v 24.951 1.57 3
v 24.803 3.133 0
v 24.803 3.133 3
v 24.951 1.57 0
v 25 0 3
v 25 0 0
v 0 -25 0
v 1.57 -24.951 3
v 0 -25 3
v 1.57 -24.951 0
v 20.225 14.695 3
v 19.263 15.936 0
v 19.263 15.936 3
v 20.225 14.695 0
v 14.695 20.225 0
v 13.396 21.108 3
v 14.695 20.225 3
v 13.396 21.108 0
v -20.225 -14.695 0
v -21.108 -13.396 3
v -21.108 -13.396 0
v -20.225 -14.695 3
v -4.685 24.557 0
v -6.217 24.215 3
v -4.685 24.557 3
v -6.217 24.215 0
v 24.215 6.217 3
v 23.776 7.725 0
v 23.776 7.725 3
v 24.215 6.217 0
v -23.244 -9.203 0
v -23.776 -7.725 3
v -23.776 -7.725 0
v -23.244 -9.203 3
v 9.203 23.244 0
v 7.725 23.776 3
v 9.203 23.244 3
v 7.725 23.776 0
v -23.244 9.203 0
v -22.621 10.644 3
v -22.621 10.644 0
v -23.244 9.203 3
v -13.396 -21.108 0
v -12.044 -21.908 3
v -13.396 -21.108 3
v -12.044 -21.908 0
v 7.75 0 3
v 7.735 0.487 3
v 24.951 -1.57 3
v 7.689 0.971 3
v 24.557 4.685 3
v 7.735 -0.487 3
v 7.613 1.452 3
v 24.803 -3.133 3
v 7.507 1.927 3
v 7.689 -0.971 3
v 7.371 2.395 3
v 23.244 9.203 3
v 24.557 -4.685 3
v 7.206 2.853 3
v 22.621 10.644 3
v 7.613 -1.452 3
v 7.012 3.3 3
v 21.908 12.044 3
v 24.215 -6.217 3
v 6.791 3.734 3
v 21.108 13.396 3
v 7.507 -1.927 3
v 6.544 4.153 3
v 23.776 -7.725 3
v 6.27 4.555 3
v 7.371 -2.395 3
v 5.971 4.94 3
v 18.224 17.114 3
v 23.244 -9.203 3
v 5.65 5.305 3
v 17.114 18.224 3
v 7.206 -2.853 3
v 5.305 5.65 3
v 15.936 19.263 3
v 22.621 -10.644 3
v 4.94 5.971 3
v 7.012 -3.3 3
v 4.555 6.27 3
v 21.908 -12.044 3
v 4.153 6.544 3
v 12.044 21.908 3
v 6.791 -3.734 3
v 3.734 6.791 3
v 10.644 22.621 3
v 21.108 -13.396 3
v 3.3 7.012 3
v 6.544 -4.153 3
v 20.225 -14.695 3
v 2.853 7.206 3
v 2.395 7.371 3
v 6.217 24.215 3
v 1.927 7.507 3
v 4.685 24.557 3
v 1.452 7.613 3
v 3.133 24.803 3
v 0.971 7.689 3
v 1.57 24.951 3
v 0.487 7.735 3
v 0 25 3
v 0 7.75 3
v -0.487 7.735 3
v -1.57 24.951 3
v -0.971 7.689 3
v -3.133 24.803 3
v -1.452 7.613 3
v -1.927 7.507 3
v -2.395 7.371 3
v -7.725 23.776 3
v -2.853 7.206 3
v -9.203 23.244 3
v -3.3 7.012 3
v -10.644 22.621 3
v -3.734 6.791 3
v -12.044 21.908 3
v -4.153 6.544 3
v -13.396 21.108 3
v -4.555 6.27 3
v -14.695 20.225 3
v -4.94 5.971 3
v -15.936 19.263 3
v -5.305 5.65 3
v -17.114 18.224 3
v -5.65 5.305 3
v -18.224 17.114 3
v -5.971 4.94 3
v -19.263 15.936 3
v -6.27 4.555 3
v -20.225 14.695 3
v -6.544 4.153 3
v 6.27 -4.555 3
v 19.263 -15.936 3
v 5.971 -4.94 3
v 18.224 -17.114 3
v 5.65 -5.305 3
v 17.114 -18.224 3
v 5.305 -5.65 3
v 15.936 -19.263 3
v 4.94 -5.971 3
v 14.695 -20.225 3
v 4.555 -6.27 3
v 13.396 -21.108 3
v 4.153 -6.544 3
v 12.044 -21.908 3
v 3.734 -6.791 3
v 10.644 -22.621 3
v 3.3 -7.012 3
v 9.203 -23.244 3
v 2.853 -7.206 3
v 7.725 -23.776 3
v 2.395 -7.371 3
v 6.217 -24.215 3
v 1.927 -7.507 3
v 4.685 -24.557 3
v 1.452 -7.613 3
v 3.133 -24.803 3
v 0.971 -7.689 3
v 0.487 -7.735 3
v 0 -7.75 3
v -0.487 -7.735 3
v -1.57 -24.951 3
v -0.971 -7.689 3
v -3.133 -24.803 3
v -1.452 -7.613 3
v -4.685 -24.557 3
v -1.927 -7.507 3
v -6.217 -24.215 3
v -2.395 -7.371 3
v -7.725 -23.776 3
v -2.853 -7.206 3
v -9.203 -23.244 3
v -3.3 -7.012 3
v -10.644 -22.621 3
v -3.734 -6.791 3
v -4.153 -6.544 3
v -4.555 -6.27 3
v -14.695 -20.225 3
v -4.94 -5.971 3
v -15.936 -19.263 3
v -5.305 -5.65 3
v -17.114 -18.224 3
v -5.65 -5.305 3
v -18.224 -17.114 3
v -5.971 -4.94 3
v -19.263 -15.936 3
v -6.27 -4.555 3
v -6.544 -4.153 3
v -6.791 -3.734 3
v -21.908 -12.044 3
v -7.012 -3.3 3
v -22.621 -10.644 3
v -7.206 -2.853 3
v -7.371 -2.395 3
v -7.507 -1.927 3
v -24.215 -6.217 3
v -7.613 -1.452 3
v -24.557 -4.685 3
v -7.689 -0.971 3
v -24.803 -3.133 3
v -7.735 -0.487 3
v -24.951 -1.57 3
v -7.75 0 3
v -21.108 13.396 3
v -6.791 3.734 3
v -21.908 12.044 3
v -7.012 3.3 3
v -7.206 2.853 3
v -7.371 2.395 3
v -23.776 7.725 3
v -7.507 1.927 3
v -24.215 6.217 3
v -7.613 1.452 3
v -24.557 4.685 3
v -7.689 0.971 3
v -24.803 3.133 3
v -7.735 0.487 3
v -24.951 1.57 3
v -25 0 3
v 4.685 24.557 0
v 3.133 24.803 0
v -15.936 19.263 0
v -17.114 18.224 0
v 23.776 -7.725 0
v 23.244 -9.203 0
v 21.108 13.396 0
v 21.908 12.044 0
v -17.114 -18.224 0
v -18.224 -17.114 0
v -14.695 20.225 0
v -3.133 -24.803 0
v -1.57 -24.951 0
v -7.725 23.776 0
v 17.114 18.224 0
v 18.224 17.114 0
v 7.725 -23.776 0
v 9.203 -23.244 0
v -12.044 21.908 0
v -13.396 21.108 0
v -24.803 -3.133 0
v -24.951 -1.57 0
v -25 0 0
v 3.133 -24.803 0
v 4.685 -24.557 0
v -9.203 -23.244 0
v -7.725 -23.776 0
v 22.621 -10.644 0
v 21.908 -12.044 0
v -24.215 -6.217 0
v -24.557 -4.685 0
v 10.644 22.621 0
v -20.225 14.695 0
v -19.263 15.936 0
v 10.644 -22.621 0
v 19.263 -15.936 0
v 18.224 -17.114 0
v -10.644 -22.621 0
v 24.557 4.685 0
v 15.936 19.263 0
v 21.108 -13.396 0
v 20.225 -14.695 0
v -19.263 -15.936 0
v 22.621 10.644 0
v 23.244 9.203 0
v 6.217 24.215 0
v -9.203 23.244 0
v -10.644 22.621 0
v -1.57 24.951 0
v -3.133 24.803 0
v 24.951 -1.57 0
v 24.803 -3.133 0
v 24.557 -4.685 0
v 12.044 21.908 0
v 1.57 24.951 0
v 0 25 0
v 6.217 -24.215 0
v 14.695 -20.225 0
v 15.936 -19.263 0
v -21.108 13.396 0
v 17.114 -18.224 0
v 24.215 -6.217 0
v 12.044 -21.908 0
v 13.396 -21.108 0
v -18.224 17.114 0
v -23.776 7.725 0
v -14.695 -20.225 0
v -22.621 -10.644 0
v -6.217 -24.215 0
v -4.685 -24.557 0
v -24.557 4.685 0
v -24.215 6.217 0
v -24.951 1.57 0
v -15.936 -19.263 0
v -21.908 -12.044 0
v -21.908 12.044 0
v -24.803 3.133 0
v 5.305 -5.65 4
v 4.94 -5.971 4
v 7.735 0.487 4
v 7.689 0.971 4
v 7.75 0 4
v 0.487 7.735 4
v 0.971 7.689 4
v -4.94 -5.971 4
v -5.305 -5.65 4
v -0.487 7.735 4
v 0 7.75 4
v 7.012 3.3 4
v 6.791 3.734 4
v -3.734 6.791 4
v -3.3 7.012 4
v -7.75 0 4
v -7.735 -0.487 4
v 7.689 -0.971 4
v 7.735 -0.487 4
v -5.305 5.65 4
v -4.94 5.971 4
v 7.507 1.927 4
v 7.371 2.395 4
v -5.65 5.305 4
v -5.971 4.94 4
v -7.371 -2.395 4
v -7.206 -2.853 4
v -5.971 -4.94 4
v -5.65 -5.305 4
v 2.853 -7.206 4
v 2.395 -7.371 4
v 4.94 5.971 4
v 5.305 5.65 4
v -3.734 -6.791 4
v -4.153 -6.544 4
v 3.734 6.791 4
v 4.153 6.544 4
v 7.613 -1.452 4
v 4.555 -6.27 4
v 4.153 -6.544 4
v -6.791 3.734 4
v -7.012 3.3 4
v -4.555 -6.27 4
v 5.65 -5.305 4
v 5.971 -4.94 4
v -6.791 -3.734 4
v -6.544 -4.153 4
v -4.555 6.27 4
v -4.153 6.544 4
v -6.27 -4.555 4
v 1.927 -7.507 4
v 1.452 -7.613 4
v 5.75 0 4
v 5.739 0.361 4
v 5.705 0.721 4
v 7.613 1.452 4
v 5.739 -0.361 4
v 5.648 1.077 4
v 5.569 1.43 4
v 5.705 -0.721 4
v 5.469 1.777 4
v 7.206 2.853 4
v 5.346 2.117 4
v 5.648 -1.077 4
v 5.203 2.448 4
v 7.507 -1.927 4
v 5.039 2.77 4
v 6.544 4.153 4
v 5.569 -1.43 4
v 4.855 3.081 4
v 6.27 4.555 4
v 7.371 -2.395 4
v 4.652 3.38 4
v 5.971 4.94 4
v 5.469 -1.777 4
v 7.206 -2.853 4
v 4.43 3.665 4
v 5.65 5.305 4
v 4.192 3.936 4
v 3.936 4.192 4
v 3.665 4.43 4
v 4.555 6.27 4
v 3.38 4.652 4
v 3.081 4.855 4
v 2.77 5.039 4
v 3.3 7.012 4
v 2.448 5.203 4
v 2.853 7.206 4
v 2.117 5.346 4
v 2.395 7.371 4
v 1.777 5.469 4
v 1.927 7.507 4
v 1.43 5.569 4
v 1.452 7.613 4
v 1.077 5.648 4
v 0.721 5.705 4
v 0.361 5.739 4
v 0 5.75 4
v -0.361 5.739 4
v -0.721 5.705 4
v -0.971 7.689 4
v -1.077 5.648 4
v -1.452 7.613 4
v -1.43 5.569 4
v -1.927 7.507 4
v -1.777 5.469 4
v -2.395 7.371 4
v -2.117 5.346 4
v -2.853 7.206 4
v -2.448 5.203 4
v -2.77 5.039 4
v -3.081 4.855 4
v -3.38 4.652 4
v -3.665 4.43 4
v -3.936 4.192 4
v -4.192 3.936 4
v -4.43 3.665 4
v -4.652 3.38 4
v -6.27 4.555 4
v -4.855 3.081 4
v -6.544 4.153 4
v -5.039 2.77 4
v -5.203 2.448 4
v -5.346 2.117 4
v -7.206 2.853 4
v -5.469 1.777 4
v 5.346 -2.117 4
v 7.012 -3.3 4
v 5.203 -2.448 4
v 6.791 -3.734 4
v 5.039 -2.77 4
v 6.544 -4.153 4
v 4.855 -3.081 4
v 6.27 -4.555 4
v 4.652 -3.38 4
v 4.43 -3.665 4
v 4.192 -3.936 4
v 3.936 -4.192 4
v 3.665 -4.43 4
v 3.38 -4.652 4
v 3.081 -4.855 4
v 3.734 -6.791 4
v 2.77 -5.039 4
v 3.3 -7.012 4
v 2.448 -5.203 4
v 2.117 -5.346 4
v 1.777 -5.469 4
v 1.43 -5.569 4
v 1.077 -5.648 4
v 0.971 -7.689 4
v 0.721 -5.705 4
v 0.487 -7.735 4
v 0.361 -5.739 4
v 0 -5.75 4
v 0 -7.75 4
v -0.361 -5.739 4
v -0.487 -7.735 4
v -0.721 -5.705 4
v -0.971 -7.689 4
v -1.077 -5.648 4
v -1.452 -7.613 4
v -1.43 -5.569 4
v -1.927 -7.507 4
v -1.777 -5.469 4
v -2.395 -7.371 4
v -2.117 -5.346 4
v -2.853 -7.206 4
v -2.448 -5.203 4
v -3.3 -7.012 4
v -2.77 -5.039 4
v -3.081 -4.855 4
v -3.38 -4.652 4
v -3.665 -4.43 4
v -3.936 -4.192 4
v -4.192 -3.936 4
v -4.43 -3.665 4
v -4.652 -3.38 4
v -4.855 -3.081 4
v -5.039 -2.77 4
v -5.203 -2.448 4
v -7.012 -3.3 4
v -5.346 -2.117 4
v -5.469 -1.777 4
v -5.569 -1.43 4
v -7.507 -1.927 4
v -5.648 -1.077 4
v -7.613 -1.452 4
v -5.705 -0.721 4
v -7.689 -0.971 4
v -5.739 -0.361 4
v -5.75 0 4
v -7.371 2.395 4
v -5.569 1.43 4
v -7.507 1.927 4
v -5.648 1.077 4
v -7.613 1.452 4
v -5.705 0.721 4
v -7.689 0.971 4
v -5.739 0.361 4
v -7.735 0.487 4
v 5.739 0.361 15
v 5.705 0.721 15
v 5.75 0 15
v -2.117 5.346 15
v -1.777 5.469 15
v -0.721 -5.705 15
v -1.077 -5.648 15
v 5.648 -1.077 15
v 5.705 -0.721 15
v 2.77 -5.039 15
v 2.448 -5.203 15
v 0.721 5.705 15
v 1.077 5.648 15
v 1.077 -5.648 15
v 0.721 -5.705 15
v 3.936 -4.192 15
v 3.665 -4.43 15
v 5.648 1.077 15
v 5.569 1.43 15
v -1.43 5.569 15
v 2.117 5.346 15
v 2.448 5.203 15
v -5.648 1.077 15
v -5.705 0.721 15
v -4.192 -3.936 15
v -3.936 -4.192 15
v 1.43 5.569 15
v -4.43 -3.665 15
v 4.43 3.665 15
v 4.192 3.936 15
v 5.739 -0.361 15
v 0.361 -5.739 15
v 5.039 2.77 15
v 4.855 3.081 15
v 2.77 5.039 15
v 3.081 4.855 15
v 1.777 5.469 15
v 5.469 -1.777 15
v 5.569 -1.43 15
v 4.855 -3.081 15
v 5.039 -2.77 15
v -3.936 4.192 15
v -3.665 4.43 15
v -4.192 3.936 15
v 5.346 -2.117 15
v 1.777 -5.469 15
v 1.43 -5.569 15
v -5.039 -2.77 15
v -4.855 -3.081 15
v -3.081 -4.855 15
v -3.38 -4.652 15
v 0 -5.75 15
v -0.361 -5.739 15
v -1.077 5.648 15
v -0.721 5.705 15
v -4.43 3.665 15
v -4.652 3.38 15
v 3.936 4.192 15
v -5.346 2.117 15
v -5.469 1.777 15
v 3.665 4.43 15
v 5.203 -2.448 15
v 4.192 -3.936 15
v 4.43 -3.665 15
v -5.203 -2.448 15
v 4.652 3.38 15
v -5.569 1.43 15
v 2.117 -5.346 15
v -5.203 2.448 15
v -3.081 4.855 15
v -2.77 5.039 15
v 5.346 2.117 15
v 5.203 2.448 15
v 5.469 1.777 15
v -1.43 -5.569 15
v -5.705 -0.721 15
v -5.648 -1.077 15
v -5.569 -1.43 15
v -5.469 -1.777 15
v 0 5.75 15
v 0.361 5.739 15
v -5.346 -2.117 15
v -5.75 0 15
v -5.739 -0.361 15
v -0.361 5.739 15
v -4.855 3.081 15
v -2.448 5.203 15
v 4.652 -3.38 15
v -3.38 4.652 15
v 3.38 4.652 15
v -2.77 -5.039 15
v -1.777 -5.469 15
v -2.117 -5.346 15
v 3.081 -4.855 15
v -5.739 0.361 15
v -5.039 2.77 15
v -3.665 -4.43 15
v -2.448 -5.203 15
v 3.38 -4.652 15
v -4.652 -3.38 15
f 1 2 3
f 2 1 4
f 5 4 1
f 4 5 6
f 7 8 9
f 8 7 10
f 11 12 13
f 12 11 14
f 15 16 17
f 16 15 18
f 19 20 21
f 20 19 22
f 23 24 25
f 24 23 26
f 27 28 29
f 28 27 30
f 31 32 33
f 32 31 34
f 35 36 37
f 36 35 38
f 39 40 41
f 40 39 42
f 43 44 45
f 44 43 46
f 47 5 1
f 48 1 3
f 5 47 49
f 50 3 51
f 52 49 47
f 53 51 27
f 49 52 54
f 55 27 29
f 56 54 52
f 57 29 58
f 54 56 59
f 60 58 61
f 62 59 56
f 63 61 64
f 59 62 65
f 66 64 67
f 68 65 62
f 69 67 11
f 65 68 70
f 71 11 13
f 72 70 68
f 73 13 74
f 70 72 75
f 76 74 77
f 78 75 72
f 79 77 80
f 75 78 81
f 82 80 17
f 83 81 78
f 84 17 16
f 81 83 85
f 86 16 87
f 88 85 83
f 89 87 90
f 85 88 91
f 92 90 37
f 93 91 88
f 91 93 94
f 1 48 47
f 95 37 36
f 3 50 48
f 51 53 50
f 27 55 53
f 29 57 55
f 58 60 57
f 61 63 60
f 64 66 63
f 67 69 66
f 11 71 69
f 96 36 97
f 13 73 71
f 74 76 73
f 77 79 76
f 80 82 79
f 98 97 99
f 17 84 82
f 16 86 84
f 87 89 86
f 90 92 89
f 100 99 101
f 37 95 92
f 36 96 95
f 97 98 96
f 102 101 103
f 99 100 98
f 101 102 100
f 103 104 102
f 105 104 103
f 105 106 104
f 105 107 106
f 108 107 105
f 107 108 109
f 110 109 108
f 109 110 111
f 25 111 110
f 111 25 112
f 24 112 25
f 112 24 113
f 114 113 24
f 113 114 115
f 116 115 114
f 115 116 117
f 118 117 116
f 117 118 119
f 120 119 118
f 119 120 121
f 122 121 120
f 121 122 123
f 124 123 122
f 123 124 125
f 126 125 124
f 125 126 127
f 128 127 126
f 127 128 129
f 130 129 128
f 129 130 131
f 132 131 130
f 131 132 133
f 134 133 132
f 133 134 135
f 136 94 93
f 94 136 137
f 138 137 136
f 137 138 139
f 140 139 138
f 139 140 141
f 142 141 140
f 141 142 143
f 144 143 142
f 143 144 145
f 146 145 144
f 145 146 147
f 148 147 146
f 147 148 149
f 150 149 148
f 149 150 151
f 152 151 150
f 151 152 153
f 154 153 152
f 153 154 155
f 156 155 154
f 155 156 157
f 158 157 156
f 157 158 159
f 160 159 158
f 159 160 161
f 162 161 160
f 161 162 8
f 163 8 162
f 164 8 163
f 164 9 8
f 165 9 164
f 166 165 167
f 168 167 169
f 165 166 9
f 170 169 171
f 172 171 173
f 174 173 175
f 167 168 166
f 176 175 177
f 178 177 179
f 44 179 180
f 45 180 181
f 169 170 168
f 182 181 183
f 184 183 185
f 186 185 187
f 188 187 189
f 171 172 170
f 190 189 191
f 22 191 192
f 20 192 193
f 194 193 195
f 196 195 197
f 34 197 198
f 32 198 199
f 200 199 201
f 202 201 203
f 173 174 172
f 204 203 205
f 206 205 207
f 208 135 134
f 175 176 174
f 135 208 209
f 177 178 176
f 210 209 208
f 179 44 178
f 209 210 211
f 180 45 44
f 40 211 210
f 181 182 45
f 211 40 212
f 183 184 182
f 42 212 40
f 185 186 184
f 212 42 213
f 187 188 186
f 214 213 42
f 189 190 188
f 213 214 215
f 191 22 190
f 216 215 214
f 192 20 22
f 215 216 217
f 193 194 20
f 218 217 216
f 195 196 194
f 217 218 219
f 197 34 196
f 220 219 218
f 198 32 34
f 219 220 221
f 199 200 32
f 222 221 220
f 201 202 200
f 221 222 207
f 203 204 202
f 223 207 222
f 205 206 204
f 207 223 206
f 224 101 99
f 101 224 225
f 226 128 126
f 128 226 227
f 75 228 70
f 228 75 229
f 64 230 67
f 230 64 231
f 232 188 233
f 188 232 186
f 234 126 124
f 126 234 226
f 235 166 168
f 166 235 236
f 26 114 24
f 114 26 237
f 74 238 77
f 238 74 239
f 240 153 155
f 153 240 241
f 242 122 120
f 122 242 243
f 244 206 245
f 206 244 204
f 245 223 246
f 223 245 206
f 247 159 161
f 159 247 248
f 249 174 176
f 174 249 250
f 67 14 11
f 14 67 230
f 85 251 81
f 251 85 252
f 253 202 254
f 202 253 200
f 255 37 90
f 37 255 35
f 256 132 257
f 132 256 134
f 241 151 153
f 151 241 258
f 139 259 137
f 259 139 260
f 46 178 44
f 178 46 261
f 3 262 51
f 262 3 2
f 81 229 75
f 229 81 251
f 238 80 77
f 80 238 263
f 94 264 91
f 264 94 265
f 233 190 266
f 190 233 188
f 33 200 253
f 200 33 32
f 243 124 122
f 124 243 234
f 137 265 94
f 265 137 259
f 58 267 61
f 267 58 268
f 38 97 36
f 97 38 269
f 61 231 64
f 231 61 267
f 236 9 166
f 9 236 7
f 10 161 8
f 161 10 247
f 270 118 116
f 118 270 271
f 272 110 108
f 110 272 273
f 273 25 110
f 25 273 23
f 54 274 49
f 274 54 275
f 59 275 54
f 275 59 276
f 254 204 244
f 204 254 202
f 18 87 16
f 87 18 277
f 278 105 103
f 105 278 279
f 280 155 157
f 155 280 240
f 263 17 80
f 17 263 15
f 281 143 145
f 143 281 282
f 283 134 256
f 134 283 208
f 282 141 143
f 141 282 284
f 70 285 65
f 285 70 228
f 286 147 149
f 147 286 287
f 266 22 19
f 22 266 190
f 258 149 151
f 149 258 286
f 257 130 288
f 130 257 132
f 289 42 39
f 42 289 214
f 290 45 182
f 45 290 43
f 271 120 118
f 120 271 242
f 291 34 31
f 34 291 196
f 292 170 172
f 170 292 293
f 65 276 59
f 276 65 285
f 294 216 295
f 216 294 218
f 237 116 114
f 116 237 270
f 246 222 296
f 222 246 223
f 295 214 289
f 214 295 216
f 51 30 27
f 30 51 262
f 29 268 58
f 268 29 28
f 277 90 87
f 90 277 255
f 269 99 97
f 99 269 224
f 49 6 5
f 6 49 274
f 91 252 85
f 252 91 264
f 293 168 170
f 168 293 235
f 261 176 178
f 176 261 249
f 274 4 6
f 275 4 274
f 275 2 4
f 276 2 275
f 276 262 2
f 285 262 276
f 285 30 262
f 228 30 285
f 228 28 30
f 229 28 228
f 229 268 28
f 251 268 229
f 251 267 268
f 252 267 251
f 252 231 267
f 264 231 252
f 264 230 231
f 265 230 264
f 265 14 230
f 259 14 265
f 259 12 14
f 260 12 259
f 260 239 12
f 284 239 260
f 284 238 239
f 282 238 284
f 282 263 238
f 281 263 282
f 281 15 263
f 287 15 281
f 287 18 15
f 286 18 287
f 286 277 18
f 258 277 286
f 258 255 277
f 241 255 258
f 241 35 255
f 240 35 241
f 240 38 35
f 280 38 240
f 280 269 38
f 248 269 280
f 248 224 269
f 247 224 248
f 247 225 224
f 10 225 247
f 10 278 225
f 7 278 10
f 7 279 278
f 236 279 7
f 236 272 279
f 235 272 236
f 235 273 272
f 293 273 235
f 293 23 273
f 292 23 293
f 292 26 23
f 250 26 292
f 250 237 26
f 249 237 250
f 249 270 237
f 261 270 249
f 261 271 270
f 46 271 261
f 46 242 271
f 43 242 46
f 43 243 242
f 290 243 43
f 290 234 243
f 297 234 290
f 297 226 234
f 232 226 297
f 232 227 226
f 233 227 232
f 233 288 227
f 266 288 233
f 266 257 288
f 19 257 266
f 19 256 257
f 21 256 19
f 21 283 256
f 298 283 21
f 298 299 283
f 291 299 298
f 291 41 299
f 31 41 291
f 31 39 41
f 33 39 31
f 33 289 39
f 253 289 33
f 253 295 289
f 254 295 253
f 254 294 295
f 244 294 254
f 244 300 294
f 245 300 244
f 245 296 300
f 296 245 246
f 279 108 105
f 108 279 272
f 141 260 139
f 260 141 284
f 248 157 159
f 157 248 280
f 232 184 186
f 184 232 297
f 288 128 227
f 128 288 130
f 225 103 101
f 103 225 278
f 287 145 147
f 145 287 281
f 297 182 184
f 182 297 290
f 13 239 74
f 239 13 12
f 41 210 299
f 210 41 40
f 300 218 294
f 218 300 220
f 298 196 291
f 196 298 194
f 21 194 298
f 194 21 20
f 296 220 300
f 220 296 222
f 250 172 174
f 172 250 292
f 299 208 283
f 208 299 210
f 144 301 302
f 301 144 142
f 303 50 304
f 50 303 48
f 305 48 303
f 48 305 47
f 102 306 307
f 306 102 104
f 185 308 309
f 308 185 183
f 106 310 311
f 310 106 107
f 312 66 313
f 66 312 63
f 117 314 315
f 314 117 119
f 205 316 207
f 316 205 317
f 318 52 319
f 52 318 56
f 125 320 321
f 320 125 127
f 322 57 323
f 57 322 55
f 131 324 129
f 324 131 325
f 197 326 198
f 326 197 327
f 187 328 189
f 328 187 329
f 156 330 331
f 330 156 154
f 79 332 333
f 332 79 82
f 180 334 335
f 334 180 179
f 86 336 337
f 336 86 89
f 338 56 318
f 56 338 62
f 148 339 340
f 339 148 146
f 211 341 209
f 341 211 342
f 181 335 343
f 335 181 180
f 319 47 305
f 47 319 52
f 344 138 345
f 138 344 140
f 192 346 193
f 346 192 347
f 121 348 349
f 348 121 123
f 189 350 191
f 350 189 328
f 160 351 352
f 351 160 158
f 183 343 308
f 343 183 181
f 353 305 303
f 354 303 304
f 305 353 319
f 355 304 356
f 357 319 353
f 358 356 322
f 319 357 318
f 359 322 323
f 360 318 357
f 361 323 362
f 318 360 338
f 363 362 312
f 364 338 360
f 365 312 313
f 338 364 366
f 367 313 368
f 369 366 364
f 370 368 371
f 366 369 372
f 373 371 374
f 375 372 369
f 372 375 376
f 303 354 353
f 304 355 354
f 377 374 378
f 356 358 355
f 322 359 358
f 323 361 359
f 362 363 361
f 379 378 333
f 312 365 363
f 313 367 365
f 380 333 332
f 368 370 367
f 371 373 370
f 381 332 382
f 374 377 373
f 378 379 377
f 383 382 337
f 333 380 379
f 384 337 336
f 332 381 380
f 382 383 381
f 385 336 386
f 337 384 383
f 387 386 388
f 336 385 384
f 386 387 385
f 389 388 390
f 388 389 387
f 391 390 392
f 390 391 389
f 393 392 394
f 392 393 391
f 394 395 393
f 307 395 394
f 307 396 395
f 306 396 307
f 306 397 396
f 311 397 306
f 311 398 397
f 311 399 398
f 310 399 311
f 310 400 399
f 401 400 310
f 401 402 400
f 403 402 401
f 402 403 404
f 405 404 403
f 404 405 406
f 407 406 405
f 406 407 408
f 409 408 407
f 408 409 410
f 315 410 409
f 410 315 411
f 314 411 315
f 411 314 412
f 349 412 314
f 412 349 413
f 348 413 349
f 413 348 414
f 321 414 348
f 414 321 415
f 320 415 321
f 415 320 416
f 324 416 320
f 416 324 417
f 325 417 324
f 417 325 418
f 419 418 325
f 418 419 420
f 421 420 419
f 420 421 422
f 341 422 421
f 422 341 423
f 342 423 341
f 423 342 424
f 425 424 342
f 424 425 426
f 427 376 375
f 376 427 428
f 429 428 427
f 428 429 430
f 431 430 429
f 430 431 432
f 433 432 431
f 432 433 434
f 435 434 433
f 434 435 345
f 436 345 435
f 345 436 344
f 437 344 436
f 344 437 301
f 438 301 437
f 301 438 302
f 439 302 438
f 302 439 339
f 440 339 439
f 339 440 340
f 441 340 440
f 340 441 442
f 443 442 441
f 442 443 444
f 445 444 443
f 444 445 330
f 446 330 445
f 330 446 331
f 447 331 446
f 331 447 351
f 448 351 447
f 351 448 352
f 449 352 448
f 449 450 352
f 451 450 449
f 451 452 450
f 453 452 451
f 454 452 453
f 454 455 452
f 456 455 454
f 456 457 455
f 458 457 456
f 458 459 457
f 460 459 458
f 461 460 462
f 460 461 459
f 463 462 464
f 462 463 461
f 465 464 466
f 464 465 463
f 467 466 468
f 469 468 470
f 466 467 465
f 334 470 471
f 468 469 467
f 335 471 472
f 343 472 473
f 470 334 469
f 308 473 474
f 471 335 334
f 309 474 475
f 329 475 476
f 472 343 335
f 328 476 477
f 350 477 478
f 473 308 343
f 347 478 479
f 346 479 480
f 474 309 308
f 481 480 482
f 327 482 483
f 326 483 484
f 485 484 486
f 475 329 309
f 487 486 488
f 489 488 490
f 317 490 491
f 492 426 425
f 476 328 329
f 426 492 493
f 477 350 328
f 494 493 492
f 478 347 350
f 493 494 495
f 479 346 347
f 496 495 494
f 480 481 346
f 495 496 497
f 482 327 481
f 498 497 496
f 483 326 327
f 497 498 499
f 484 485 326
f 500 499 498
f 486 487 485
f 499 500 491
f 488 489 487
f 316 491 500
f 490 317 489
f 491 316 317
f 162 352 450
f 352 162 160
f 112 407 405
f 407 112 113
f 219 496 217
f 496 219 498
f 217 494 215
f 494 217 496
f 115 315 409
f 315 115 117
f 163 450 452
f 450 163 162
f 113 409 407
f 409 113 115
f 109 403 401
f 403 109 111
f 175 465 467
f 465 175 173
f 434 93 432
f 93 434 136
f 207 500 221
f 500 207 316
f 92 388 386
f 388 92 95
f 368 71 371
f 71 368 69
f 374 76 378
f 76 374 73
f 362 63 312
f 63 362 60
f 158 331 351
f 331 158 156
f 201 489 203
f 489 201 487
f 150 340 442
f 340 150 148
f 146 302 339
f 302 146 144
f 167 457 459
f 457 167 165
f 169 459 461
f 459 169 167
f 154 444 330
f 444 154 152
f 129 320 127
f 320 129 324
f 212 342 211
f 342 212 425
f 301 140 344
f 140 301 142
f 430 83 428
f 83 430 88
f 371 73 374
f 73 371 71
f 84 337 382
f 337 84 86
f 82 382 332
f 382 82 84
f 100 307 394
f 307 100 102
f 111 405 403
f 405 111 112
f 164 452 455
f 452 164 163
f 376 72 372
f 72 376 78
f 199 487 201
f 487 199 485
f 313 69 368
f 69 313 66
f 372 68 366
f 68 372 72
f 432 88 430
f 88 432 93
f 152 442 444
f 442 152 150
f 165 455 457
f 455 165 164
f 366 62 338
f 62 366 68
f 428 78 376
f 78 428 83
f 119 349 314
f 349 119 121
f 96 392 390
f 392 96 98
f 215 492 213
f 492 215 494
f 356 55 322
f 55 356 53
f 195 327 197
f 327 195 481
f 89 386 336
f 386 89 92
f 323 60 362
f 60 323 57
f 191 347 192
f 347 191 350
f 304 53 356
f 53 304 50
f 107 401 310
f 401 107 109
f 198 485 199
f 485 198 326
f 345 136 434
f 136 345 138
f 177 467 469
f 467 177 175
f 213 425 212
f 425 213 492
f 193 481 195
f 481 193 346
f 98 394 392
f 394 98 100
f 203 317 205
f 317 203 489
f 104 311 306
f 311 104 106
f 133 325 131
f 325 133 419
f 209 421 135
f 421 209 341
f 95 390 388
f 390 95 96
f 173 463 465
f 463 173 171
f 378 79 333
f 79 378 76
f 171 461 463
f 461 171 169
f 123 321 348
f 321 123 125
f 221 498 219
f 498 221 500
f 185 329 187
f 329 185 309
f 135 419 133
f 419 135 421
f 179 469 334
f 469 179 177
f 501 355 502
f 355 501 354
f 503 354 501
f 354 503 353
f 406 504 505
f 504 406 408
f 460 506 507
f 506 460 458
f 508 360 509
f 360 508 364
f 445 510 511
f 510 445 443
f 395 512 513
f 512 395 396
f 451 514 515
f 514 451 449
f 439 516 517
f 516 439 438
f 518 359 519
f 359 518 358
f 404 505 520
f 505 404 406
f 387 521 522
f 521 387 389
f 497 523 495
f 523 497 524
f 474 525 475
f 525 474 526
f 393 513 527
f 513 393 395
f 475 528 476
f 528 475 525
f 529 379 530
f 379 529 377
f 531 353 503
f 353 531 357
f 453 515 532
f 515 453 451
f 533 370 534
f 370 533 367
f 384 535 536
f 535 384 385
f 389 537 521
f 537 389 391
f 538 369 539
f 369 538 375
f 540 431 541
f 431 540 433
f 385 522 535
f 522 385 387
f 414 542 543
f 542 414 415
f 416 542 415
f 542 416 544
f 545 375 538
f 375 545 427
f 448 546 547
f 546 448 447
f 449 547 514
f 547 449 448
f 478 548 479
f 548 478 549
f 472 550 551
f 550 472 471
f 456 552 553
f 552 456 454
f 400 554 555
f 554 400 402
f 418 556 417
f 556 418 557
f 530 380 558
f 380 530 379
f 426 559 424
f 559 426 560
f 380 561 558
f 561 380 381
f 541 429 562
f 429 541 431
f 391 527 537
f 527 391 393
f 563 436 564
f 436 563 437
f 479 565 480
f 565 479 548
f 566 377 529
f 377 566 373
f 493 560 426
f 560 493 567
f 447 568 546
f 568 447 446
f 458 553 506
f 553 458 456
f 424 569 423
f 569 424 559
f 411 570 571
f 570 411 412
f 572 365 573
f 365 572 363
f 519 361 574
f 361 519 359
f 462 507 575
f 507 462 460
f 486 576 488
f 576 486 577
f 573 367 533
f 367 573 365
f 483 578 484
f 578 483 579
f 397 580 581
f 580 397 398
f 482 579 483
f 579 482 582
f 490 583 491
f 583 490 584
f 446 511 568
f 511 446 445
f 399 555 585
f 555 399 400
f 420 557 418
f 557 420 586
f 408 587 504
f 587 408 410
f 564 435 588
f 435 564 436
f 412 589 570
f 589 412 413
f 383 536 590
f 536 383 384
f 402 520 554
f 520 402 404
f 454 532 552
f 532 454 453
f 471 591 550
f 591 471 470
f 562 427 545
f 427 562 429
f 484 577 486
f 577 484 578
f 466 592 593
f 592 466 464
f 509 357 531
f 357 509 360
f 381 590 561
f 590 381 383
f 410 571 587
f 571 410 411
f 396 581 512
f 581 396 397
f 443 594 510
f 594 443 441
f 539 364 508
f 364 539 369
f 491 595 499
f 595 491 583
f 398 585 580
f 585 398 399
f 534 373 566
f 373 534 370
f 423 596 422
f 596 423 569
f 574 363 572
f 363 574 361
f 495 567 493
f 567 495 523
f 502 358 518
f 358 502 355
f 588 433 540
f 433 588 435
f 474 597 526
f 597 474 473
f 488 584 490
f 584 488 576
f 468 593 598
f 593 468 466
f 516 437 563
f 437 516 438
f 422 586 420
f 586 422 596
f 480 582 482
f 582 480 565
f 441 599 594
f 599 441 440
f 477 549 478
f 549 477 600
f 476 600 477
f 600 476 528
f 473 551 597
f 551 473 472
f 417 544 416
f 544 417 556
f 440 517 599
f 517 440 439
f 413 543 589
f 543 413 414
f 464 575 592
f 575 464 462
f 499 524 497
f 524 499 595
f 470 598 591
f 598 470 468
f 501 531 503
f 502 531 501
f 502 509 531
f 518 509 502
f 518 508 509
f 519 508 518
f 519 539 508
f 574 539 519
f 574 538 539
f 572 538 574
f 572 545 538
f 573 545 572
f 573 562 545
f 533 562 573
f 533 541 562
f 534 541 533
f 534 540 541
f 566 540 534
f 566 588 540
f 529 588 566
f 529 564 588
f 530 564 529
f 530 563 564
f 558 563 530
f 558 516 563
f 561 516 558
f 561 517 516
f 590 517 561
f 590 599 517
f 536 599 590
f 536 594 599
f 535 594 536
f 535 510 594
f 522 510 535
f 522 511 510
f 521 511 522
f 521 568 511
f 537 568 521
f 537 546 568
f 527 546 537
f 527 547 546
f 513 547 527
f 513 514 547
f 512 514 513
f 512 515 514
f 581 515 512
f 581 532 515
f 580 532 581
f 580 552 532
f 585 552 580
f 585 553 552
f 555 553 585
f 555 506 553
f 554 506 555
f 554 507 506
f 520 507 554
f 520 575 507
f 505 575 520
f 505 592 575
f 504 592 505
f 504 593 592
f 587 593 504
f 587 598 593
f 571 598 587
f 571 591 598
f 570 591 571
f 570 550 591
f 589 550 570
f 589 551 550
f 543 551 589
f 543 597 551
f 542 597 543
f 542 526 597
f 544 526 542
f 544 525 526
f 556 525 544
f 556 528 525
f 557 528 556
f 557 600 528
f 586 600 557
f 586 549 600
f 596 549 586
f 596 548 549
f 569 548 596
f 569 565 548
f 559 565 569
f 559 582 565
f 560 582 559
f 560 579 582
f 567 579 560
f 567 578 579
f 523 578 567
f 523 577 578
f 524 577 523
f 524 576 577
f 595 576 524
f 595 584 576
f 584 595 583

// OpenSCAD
THICKNESS = 3;
DIAMETER = 50;
BEARING_INNER_DIAMETER = 11.5;
BEARING_LIP_DIAMETER = BEARING_INNER_DIAMETER + 4;
BEARING_LIP_THICKNESS = 1;
BEARING_THICKNESS = 12;

$fn = 100;

union() {
    cylinder(h = THICKNESS, d = DIAMETER);
    cylinder(h = THICKNESS+BEARING_LIP_THICKNESS, d = BEARING_LIP_DIAMETER);
    cylinder(h = THICKNESS + BEARING_THICKNESS, d = BEARING_INNER_DIAMETER);
}
